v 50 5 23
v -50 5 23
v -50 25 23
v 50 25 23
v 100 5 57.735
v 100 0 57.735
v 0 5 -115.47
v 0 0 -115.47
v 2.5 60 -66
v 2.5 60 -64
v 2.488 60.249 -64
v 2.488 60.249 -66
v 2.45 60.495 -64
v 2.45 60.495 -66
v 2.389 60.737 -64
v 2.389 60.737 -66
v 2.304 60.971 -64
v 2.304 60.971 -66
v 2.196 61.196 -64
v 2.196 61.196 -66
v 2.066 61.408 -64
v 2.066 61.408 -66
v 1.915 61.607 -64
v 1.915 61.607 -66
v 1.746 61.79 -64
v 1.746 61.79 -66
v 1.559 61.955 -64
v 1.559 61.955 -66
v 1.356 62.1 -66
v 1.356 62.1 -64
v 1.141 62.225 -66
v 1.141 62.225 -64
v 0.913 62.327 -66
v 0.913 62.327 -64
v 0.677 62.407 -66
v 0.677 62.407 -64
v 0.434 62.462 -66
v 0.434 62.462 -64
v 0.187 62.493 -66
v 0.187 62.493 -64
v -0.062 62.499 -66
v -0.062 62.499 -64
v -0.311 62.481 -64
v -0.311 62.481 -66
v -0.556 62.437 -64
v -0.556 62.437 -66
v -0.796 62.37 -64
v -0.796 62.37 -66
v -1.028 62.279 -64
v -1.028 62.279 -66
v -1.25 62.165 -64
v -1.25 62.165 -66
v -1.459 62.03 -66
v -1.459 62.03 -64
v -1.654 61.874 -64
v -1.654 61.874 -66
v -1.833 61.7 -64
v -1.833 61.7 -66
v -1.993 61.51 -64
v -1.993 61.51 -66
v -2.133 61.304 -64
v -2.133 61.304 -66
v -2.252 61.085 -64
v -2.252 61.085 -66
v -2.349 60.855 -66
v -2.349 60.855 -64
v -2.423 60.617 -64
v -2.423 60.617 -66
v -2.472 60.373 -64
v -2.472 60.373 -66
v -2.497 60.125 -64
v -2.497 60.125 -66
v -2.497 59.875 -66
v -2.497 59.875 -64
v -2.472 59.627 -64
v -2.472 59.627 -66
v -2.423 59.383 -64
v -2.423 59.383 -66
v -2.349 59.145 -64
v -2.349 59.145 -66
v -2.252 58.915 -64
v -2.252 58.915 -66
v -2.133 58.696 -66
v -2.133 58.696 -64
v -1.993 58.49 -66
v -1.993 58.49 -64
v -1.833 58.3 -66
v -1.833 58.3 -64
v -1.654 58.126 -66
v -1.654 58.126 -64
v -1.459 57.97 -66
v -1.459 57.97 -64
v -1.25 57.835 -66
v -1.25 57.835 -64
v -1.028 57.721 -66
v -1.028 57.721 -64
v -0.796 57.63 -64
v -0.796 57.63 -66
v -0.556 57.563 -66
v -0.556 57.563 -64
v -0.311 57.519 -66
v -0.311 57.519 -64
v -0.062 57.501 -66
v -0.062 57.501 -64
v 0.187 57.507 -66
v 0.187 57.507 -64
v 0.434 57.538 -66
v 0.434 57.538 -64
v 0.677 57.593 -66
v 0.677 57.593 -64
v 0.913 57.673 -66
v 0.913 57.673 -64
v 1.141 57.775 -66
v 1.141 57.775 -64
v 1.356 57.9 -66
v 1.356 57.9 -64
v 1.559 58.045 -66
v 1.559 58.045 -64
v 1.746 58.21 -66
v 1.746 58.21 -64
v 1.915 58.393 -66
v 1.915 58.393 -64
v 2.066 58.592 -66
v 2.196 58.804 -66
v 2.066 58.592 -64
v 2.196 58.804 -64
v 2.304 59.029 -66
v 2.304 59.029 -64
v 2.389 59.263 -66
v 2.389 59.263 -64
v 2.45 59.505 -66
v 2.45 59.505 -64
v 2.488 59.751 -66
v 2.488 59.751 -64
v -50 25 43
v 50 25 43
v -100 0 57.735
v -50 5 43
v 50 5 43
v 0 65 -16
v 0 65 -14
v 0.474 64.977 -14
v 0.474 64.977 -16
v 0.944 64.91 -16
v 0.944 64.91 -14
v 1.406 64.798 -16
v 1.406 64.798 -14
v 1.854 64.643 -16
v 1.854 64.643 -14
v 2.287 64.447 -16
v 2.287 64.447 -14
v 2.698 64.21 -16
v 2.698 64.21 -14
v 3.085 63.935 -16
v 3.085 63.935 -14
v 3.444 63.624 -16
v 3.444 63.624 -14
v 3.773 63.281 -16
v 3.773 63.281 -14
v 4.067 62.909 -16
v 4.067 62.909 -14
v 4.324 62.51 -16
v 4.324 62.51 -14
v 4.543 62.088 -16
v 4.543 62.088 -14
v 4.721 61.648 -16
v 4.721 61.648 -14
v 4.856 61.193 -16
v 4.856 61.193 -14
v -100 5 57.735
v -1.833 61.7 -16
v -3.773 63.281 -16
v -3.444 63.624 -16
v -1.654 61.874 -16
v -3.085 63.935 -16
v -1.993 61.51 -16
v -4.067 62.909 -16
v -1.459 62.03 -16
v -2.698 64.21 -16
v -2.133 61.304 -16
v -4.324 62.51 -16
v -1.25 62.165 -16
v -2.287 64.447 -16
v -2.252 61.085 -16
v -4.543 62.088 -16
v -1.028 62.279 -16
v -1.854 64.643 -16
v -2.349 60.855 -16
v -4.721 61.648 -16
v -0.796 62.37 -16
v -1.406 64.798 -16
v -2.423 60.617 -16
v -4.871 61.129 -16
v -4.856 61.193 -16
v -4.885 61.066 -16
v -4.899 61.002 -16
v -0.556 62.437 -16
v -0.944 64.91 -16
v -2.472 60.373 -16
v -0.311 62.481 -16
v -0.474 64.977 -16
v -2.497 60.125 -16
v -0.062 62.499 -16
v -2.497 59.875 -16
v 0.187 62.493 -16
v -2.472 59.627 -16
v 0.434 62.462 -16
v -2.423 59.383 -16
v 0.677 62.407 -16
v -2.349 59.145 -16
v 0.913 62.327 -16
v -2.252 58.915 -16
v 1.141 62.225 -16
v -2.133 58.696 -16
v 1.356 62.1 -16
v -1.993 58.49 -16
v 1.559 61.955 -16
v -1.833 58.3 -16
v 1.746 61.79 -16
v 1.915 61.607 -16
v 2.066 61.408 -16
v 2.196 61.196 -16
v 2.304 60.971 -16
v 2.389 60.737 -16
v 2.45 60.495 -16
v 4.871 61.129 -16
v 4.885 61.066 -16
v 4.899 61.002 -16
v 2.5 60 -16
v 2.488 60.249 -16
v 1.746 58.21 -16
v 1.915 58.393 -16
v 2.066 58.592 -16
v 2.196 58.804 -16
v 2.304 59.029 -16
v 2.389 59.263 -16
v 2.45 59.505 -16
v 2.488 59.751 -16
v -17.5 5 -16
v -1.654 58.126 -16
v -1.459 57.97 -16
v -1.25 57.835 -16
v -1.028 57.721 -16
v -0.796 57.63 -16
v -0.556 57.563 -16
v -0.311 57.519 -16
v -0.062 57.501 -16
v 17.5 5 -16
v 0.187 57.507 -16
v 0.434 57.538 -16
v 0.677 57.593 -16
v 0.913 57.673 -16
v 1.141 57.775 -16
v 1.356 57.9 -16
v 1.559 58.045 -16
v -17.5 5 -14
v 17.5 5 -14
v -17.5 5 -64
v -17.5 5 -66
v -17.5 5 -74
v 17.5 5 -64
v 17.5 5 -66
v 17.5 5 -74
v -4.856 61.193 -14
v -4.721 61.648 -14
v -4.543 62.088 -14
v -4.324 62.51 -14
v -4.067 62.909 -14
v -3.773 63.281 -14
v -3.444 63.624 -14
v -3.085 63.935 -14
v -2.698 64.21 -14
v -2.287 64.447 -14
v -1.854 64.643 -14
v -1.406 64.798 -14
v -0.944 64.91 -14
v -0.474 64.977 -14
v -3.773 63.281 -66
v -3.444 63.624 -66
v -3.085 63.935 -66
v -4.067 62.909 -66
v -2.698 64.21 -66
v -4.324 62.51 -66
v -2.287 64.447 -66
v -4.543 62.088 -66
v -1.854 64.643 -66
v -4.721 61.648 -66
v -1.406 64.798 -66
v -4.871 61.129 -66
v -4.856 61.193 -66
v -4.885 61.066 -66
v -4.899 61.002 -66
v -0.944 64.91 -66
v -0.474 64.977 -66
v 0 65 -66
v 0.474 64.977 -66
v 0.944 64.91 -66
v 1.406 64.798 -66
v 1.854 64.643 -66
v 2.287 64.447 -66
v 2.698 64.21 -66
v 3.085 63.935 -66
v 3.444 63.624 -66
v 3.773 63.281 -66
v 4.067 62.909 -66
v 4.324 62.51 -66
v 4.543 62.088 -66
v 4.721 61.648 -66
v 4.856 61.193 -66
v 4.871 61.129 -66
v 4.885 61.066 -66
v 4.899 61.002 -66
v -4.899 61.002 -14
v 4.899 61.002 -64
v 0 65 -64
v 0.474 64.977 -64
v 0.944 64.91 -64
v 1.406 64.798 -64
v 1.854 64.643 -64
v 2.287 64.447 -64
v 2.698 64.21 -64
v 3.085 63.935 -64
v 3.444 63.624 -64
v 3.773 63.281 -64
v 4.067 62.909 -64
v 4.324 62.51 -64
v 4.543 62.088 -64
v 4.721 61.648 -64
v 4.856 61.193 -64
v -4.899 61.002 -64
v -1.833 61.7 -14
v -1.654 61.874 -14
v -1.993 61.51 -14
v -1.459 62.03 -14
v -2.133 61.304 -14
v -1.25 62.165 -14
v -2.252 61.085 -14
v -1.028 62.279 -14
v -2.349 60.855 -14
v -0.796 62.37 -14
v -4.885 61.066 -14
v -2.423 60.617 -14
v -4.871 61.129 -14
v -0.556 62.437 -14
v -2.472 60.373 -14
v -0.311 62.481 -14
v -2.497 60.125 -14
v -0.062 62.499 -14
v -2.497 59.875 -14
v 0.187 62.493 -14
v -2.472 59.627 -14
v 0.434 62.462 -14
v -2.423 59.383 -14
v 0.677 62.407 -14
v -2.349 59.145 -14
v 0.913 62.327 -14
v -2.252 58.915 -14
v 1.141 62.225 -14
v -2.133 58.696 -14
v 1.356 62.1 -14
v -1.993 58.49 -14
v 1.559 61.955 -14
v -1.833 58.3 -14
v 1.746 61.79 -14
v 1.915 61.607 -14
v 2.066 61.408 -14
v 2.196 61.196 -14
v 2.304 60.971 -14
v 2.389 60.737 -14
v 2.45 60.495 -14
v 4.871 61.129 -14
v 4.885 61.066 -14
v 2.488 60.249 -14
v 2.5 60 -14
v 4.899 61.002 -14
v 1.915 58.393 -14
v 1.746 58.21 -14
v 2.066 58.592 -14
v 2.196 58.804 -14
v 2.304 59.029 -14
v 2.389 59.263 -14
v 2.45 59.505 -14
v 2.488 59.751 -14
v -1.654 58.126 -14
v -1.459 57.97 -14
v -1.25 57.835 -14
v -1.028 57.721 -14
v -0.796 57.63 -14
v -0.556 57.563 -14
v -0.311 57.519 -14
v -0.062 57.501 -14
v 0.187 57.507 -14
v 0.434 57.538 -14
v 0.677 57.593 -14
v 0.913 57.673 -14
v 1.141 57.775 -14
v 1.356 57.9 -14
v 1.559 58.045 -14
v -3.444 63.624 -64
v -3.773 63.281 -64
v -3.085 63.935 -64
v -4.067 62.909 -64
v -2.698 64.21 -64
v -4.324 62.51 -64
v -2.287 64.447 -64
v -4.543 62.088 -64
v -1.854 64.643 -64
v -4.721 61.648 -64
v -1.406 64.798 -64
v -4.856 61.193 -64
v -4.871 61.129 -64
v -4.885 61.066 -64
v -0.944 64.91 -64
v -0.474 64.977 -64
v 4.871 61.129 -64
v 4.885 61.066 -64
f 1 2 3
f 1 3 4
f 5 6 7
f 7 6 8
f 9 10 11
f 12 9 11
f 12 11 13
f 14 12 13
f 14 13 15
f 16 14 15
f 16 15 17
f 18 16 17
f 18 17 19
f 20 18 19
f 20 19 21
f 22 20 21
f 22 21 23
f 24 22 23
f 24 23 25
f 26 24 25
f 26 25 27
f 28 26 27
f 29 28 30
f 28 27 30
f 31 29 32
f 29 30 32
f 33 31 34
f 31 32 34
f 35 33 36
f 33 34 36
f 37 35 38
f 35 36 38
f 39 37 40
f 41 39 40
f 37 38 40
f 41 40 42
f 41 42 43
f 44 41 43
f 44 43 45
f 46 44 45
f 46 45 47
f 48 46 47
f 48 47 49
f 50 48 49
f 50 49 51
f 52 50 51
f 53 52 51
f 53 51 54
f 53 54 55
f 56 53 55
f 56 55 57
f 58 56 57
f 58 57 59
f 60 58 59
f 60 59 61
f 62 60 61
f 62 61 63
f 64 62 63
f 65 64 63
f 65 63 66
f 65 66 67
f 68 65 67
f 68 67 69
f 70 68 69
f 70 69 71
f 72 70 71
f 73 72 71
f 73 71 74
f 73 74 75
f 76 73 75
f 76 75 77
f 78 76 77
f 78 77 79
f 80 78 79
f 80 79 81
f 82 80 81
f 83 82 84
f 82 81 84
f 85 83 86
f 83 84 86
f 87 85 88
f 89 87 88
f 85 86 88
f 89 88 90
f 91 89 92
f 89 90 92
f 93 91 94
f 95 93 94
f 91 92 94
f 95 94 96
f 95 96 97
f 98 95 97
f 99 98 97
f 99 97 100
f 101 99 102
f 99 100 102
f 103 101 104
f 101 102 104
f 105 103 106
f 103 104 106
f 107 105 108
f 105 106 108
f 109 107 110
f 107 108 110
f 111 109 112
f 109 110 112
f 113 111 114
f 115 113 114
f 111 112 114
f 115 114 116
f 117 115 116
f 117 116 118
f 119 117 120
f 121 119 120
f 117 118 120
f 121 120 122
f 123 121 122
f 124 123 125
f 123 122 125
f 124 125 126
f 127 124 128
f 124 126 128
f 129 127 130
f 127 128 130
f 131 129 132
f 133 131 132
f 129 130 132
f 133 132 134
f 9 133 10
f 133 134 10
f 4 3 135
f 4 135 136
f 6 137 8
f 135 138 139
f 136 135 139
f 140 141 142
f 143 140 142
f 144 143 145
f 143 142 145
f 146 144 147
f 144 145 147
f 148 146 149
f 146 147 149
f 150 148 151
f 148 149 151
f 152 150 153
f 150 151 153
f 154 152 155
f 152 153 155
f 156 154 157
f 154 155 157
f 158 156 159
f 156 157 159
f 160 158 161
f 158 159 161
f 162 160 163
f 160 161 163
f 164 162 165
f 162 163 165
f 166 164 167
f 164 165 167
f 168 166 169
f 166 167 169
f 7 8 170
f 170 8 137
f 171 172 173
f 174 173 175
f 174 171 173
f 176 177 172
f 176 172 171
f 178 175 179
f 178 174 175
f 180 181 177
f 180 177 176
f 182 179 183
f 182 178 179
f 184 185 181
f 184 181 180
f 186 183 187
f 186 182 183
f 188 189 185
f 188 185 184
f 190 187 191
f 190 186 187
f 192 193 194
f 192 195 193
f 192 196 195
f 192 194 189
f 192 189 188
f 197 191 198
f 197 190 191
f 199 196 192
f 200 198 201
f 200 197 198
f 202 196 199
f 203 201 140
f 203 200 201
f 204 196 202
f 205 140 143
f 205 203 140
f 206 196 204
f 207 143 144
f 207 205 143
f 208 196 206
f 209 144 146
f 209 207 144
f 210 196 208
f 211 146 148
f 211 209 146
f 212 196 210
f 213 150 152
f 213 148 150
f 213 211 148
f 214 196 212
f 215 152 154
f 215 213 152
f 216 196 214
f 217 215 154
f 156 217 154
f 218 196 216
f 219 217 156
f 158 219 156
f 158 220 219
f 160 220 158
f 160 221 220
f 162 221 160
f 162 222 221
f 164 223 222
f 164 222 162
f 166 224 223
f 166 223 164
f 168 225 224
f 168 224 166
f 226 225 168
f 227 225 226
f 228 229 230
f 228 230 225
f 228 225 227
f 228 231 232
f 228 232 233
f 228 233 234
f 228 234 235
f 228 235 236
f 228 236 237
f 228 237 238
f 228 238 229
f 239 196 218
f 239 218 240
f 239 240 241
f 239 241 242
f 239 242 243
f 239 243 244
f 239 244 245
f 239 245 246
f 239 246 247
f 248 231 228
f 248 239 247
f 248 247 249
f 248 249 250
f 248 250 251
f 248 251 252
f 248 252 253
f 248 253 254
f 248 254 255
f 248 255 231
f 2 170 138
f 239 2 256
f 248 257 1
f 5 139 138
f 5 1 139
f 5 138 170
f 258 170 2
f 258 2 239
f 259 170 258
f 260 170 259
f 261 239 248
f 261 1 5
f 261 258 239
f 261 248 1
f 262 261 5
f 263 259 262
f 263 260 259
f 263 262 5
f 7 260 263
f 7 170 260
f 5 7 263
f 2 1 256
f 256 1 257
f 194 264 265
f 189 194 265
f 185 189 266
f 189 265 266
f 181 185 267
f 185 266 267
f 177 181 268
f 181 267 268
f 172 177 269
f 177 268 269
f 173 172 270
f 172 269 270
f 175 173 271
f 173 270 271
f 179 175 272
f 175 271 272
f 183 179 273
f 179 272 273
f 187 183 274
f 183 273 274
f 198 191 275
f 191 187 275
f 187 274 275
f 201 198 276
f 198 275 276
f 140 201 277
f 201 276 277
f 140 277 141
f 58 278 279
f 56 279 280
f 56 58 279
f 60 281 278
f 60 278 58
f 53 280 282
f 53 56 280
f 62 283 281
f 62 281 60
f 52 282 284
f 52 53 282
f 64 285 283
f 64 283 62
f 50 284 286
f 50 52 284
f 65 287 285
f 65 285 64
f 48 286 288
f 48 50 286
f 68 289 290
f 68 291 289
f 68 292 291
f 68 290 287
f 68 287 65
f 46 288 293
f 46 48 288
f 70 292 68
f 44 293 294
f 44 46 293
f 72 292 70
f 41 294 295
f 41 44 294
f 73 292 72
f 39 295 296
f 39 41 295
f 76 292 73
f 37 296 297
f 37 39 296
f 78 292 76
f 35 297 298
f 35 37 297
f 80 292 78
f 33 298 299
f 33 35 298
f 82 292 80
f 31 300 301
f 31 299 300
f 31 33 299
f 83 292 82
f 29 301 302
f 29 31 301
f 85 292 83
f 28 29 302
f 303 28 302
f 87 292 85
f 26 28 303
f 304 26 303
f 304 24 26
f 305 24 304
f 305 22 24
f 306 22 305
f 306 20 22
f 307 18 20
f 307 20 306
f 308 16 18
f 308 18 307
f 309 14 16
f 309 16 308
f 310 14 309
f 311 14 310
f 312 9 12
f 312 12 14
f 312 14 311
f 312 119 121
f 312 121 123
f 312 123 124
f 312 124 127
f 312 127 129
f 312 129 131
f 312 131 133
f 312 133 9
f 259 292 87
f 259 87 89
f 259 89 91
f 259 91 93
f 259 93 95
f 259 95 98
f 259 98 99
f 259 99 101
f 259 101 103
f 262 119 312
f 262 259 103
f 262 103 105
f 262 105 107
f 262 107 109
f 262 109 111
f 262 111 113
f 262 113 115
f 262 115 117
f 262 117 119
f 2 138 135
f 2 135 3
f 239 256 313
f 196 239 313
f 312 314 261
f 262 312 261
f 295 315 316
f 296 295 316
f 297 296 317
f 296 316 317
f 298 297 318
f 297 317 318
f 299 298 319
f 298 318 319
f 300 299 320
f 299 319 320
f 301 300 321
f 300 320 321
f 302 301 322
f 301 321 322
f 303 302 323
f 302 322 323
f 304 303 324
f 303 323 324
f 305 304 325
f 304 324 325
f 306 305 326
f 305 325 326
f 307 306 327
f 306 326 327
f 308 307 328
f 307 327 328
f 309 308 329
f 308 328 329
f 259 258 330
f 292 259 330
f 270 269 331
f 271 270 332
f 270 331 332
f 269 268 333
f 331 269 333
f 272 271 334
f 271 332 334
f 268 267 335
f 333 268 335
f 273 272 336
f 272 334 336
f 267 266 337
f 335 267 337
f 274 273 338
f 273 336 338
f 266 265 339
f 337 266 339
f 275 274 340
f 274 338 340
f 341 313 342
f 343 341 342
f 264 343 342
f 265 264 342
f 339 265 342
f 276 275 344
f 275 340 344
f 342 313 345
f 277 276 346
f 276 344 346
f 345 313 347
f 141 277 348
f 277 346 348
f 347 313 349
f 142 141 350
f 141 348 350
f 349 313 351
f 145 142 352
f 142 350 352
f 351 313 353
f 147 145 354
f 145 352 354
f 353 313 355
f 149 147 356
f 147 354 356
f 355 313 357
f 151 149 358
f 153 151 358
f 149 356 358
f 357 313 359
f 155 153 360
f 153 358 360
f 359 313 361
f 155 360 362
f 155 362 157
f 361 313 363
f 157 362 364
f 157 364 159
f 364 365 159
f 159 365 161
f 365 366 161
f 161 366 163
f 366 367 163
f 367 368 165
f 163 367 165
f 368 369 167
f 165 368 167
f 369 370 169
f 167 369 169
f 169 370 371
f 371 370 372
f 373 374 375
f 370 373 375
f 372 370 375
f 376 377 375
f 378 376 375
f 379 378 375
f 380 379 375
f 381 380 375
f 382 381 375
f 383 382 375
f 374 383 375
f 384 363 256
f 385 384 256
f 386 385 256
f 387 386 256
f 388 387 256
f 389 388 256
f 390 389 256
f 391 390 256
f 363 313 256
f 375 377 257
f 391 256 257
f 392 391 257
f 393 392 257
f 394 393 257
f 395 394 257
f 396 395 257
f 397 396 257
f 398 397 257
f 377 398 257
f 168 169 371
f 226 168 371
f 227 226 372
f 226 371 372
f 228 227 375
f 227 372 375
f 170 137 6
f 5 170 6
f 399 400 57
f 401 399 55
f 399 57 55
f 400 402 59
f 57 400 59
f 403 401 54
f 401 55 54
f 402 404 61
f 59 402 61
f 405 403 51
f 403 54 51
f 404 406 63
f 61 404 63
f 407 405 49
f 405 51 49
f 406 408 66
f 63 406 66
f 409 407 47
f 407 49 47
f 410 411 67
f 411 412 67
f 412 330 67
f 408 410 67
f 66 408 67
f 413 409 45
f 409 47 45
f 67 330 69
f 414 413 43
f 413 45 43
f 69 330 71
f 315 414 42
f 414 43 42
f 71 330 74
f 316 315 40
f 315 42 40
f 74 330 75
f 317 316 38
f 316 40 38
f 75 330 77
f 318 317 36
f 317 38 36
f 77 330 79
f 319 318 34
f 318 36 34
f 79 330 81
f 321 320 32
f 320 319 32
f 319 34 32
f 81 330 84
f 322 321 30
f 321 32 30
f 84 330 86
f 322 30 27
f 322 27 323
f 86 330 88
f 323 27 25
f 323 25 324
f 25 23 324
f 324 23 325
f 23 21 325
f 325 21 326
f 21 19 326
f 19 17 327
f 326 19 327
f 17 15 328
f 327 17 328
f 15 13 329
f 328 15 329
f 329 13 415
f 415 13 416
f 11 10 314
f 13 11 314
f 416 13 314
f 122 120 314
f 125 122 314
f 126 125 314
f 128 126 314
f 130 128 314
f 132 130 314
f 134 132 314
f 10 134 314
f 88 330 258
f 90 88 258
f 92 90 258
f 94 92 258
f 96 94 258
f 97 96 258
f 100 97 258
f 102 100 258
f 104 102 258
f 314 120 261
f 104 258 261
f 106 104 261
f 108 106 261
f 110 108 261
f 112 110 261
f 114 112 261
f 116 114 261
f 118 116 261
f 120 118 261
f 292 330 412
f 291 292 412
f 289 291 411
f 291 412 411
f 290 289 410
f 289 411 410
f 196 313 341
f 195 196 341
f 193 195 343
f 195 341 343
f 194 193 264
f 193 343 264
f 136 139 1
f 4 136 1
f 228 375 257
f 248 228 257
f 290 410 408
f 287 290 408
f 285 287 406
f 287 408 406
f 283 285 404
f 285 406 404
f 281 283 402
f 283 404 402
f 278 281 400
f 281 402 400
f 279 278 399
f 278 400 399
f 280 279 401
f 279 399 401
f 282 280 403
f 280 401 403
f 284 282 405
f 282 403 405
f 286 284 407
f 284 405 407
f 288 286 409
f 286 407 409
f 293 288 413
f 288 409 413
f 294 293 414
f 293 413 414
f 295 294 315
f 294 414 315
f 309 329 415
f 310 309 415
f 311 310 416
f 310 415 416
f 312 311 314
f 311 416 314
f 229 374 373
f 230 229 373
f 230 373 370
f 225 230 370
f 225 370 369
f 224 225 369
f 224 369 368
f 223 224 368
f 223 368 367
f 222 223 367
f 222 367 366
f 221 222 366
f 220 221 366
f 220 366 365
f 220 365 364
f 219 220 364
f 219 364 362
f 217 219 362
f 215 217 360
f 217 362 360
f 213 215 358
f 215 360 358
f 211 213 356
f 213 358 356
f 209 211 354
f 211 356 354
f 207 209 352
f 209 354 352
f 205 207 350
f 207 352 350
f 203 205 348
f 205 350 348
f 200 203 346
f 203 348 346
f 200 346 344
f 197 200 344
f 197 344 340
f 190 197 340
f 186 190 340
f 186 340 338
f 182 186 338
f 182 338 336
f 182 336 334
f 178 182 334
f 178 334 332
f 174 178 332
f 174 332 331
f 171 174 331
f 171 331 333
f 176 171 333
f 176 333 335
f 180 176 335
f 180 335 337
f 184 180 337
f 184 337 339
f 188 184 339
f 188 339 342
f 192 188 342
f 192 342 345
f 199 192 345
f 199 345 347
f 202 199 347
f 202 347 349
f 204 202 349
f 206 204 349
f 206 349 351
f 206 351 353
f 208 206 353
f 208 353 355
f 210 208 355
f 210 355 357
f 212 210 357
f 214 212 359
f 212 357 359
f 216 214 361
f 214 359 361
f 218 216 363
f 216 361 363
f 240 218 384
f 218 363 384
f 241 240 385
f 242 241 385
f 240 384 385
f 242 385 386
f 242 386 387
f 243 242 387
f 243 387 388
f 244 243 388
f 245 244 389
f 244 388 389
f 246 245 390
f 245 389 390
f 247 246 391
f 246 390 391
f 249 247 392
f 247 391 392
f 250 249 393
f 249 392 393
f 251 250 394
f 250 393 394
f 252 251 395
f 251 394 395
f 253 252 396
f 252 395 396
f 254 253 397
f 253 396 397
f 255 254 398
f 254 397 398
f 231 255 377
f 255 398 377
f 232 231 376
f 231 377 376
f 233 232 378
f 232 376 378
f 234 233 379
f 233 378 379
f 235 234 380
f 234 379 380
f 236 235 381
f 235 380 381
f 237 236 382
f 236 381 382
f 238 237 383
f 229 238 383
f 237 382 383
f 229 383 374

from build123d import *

# Parameters (mm, degrees)
BOSS_EXTRUDE1_DEPTH = 5
SKETCH2_W           = 35
SKETCH2_H           = 2
BOSS_EXTRUDE2_DEPTH = 60
CUT_EXTRUDE1_DEPTH  = 60
SKETCH4_R           = 2.5
CUT_EXTRUDE2_DEPTH  = 60
SKETCH5_W           = 100
SKETCH5_H           = 20
BOSS_EXTRUDE3_DEPTH = 20


with BuildPart() as part:
    # Sketch1 → Boss-Extrude1 (new body)
    with BuildSketch(Plane(origin=(0, 0, 0), x_dir=(1, 0, 0), z_dir=(0, 1, 0))):
        Polygon((0, 115.470053838), (-100, -57.735026919), (100, -57.735026919), align=None)
    extrude(amount=BOSS_EXTRUDE1_DEPTH)

    # Sketch2 → Boss-Extrude2 (add)
    with BuildSketch(Plane(origin=(0, 5, 0), x_dir=(1, 0, 0), z_dir=(0, 1, 0))):
        with Locations((0, 65)):
            Rectangle(SKETCH2_W, SKETCH2_H)
        with Locations((0, 15)):
            Rectangle(SKETCH2_W, SKETCH2_H)
    extrude(amount=BOSS_EXTRUDE2_DEPTH)

    # Sketch3 → Cut-Extrude1 (cut)
    with BuildSketch(Plane.XY.offset(-14)):
        with BuildLine():
            Line((-17.5, 65), (-17.5, 5))
            Line((-17.5, 5), (-4.898590768, 61.001902433))
            ThreePointArc((-4.898590768, 61.001902433), (-4.878030477, 61.097642323), (-4.855599196, 61.192961208))
            ThreePointArc((-4.855599196, 61.192961208), (-3.085060288, 63.934768484), (0, 65))
            Line((0, 65), (-17.5, 65))
        make_face()
        with BuildLine():
            Line((17.5, 65), (0, 65))
            ThreePointArc((0, 65), (3.085060288, 63.934768484), (4.855599196, 61.192961208))
            ThreePointArc((4.855599196, 61.192961208), (4.878030477, 61.097642323), (4.898590768, 61.001902433))
            Line((4.898590768, 61.001902433), (17.5, 5))
            Line((17.5, 5), (17.5, 65))
        make_face()
    extrude(amount=-CUT_EXTRUDE1_DEPTH, mode=Mode.SUBTRACT)

    # Sketch4 → Cut-Extrude2 (cut)
    with BuildSketch(Plane.XY.offset(-14)):
        with Locations((0, 60)):
            Circle(SKETCH4_R)
    extrude(amount=-CUT_EXTRUDE2_DEPTH, mode=Mode.SUBTRACT)

    # Sketch5 → Boss-Extrude3 (add)
    with BuildSketch(Plane(origin=(0, 5, 0), x_dir=(1, 0, 0), z_dir=(0, 1, 0))):
        with Locations((0, -33)):
            Rectangle(SKETCH5_W, SKETCH5_H)
    extrude(amount=BOSS_EXTRUDE3_DEPTH)


solid = part.part
